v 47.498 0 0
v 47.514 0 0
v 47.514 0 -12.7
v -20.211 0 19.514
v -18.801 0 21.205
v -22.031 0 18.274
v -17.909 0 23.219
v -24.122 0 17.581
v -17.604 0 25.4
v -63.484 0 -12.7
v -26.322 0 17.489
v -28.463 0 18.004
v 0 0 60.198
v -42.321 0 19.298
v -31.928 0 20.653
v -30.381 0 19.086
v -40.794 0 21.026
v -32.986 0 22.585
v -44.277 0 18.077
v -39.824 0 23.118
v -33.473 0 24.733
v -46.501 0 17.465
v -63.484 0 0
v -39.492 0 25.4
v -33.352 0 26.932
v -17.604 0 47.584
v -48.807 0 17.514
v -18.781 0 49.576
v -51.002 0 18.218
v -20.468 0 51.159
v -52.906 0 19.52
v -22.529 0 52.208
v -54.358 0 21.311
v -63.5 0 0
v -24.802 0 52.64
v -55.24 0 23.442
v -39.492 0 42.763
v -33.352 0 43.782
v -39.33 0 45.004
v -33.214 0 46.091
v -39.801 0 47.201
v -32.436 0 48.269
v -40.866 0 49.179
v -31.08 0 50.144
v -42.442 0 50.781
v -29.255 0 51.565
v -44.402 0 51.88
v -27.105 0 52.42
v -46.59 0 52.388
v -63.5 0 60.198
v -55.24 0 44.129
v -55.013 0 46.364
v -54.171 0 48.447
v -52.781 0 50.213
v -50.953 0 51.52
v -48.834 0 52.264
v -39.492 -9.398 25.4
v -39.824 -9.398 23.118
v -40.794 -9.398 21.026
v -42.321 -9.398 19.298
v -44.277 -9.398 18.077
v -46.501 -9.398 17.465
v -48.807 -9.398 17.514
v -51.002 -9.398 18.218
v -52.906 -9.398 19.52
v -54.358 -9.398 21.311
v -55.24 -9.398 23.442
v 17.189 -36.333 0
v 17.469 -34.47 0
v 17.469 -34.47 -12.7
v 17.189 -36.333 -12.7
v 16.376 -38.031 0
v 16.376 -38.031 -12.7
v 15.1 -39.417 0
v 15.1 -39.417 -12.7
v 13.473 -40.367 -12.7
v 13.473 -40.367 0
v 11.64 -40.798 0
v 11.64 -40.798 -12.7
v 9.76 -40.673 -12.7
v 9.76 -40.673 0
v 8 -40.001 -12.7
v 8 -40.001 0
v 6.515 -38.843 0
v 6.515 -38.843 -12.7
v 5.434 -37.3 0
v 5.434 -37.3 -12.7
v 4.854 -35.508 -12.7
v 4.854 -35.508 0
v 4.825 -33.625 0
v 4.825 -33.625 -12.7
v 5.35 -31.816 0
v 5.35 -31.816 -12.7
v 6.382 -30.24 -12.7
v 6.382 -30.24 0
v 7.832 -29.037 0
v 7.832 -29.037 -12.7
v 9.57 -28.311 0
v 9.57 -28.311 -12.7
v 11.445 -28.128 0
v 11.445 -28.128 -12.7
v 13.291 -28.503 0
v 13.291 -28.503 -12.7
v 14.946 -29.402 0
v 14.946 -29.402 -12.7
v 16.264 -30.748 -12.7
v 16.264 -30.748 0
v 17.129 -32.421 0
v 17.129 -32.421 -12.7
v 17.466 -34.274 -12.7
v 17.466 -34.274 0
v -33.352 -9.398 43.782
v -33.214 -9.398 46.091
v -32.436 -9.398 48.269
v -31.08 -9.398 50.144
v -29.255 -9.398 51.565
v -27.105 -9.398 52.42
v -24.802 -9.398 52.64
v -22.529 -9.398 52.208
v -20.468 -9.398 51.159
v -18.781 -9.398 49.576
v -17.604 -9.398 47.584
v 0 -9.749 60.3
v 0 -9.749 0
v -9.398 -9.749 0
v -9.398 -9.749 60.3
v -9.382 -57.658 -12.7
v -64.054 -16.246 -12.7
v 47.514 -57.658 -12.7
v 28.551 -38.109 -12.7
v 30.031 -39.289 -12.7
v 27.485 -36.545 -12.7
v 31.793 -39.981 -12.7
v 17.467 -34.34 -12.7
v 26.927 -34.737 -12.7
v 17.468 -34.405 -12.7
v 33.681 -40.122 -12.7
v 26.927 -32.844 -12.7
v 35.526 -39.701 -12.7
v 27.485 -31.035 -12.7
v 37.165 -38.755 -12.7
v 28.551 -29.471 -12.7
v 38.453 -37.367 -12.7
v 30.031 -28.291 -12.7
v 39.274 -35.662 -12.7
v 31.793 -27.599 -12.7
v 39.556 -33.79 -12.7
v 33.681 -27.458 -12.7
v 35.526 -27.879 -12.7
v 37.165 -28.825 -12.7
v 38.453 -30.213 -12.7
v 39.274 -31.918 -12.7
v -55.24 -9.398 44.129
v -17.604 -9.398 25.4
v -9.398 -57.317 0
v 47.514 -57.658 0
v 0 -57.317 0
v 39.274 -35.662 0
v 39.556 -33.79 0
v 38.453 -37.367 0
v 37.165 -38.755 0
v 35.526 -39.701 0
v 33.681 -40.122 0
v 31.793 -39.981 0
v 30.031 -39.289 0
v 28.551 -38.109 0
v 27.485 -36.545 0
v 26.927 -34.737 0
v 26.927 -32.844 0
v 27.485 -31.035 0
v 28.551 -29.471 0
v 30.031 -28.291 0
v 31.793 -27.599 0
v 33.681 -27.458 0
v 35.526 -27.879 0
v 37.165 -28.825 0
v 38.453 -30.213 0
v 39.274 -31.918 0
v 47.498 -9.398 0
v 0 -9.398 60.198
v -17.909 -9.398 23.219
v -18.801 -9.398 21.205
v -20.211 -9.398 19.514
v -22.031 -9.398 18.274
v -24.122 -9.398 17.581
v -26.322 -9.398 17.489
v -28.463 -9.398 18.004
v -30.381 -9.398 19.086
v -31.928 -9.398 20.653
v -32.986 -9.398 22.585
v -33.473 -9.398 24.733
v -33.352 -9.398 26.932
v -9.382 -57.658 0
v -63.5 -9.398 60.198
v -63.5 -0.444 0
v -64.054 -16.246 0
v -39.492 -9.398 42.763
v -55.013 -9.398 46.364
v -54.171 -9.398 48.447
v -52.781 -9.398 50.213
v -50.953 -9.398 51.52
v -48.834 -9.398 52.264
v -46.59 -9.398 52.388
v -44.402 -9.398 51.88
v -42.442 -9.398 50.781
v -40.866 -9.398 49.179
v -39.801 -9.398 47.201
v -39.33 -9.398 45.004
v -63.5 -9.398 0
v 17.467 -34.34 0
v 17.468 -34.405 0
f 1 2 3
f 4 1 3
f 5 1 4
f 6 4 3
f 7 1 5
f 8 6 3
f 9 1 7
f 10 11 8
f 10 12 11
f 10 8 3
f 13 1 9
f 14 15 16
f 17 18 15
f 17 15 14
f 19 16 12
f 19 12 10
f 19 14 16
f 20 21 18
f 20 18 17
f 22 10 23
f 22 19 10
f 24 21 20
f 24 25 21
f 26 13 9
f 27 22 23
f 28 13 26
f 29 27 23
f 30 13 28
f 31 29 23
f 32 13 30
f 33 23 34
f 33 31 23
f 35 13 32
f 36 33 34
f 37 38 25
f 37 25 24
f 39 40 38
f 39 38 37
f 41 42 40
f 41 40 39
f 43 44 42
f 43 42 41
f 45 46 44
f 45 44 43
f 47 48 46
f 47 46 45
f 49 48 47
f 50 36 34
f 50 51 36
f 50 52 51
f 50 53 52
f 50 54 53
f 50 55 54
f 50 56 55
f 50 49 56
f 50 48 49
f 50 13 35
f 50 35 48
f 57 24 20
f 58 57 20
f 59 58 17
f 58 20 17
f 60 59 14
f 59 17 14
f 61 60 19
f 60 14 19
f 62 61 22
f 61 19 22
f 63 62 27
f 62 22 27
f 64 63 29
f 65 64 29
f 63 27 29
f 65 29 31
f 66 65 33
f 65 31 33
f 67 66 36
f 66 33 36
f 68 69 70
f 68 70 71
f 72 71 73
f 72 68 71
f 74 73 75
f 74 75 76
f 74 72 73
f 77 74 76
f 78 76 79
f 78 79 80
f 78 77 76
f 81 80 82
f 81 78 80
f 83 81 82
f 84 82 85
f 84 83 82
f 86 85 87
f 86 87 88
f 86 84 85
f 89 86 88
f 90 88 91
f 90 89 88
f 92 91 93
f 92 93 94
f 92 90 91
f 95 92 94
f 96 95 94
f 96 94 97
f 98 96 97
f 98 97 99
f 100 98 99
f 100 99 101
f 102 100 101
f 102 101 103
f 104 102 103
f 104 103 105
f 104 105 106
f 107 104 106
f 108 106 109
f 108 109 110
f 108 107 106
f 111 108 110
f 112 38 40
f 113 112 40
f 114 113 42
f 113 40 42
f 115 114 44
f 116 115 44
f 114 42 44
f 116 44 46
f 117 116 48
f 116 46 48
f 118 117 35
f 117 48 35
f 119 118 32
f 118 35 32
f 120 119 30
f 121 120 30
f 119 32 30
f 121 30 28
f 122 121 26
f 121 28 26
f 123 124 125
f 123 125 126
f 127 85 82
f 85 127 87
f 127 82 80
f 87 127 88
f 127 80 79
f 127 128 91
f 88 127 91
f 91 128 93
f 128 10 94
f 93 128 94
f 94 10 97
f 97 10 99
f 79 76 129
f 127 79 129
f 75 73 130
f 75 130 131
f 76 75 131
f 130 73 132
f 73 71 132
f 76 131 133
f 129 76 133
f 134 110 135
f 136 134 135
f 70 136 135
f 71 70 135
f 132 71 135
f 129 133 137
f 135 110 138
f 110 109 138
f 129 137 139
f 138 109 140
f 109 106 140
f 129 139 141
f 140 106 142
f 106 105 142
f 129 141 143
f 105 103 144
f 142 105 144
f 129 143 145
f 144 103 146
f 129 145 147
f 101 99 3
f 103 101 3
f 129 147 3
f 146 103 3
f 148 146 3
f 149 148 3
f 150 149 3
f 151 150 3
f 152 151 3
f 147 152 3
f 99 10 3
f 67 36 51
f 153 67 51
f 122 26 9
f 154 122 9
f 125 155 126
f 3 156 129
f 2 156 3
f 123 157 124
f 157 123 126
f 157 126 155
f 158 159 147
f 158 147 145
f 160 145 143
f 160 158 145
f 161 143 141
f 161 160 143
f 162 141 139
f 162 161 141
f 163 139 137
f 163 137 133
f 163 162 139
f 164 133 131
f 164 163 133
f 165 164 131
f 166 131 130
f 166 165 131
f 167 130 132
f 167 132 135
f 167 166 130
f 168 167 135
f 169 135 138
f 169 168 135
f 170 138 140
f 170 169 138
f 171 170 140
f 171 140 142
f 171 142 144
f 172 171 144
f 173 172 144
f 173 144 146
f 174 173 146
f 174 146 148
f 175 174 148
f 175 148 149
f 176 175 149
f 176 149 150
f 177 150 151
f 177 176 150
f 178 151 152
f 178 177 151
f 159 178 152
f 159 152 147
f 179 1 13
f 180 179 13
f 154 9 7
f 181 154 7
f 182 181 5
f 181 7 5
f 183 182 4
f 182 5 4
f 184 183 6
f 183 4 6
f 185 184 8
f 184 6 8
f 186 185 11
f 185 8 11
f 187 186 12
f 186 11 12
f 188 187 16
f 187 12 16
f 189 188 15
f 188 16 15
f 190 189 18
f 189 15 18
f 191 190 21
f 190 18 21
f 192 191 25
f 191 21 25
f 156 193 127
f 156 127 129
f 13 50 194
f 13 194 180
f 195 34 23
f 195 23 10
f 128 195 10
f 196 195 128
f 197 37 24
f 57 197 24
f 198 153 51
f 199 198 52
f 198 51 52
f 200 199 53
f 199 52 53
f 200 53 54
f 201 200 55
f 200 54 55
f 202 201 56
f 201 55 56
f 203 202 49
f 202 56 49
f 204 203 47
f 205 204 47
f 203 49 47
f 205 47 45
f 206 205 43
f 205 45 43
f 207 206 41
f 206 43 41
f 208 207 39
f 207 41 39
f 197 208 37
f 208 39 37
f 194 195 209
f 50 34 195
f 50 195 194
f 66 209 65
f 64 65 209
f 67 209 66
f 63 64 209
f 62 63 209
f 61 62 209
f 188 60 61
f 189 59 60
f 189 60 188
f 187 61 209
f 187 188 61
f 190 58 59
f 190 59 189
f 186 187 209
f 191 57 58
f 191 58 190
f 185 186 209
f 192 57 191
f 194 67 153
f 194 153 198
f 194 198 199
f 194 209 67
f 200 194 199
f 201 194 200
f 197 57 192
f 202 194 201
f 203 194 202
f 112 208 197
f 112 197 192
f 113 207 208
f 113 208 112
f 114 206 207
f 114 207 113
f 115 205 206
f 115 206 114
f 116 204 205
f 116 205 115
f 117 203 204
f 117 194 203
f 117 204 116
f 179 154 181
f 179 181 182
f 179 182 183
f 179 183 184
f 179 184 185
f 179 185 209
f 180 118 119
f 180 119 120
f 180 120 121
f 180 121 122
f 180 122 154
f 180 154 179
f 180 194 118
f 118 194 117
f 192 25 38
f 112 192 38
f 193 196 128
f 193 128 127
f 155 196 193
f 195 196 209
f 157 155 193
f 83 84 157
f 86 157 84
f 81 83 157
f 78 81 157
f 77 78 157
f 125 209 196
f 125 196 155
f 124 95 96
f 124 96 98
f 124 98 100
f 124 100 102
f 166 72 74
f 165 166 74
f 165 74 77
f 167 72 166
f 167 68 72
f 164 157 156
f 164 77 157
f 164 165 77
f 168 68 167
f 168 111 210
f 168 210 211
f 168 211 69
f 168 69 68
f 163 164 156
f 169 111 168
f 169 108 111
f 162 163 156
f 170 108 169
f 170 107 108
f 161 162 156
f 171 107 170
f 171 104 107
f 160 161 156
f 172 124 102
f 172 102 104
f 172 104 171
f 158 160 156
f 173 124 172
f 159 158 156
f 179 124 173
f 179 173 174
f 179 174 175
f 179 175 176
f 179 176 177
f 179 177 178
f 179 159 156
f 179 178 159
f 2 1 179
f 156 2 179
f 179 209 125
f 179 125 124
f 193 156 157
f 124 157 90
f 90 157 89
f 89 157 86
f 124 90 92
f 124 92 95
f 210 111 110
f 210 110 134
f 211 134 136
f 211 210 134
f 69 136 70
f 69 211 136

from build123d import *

# Parameters (mm, degrees)
F0_W     = 63.5
F0_H     = 60.198
F1_DEPTH = 9.398
F3_DEPTH = 12.7
F5_DEPTH = 9.398


with BuildPart() as f1:
    # F0 (on Front) → F1 (new body)
    with BuildSketch(Plane.XZ):
        with Locations((-31.75, 30.099)):
            Rectangle(F0_W, F0_H)
        with BuildLine():
            ThreePointArc((-55.2396252751, 44.1290847957), (-46.5901332262, 52.387728278), (-39.4916252751, 42.7632755798))
            Line((-39.4916252751, 42.7632755798), (-39.4916252751, 25.4))
            ThreePointArc((-39.4916252751, 25.4), (-46.5009541347, 17.4653953282), (-55.2396252751, 23.442373583))
            Line((-55.2396252751, 23.442373583), (-55.2396252751, 44.1290847957))
        make_face(mode=Mode.SUBTRACT)
        with BuildLine():
            ThreePointArc((-33.3522260189, 43.7816642225), (-27.1048819761, 52.4199260723), (-17.6042260189, 47.5839761388))
            Line((-17.6042260189, 47.5839761388), (-17.6042260189, 25.4))
            ThreePointArc((-17.6042260189, 25.4), (-26.3222239844, 17.4888395764), (-33.3522260189, 26.9317744576))
            Line((-33.3522260189, 26.9317744576), (-33.3522260189, 43.7816642225))
        make_face(mode=Mode.SUBTRACT)
        Polygon((47.498, 0), (0, 60.198), (0, 0), align=None)
    extrude(amount=F1_DEPTH)

    # F2 (on Top) → F3 (join)
    with BuildSketch(Plane.XY):
        Polygon((47.5135771375, 0), (-63.4844228625, 0), (-64.0543534469, -16.2460061286), (-9.3824228625, -57.658), (47.5135771375, -57.658), align=None)
        with BuildLine():
            ThreePointArc((17.4686820134, -34.4697237222), (4.7694330104, -34.5673817862), (17.4656782032, -34.2744306938))
            ThreePointArc((17.4656782032, -34.2744306938), (17.4679310165, -34.3720656582), (17.4686820134, -34.4697237222))
        make_face(mode=Mode.SUBTRACT)
        with BuildLine():
            ThreePointArc((26.8592325641, -33.9853970117), (33.1085706899, -27.4408549802), (39.5562287539, -33.7901039832))
            ThreePointArc((39.5562287539, -33.7901039832), (33.3038868178, -40.1393529863), (26.8592325641, -33.9853970117))
        make_face(mode=Mode.SUBTRACT)
    extrude(amount=-F3_DEPTH)

    # F4 (on Right) → F5 (join)
    with BuildSketch(Plane.YZ):
        Polygon((-9.7489070876, 0), (-9.7489070876, 60.2996), (-57.3169094876, 0), align=None)
    extrude(amount=-F5_DEPTH)


solid = f1.part
